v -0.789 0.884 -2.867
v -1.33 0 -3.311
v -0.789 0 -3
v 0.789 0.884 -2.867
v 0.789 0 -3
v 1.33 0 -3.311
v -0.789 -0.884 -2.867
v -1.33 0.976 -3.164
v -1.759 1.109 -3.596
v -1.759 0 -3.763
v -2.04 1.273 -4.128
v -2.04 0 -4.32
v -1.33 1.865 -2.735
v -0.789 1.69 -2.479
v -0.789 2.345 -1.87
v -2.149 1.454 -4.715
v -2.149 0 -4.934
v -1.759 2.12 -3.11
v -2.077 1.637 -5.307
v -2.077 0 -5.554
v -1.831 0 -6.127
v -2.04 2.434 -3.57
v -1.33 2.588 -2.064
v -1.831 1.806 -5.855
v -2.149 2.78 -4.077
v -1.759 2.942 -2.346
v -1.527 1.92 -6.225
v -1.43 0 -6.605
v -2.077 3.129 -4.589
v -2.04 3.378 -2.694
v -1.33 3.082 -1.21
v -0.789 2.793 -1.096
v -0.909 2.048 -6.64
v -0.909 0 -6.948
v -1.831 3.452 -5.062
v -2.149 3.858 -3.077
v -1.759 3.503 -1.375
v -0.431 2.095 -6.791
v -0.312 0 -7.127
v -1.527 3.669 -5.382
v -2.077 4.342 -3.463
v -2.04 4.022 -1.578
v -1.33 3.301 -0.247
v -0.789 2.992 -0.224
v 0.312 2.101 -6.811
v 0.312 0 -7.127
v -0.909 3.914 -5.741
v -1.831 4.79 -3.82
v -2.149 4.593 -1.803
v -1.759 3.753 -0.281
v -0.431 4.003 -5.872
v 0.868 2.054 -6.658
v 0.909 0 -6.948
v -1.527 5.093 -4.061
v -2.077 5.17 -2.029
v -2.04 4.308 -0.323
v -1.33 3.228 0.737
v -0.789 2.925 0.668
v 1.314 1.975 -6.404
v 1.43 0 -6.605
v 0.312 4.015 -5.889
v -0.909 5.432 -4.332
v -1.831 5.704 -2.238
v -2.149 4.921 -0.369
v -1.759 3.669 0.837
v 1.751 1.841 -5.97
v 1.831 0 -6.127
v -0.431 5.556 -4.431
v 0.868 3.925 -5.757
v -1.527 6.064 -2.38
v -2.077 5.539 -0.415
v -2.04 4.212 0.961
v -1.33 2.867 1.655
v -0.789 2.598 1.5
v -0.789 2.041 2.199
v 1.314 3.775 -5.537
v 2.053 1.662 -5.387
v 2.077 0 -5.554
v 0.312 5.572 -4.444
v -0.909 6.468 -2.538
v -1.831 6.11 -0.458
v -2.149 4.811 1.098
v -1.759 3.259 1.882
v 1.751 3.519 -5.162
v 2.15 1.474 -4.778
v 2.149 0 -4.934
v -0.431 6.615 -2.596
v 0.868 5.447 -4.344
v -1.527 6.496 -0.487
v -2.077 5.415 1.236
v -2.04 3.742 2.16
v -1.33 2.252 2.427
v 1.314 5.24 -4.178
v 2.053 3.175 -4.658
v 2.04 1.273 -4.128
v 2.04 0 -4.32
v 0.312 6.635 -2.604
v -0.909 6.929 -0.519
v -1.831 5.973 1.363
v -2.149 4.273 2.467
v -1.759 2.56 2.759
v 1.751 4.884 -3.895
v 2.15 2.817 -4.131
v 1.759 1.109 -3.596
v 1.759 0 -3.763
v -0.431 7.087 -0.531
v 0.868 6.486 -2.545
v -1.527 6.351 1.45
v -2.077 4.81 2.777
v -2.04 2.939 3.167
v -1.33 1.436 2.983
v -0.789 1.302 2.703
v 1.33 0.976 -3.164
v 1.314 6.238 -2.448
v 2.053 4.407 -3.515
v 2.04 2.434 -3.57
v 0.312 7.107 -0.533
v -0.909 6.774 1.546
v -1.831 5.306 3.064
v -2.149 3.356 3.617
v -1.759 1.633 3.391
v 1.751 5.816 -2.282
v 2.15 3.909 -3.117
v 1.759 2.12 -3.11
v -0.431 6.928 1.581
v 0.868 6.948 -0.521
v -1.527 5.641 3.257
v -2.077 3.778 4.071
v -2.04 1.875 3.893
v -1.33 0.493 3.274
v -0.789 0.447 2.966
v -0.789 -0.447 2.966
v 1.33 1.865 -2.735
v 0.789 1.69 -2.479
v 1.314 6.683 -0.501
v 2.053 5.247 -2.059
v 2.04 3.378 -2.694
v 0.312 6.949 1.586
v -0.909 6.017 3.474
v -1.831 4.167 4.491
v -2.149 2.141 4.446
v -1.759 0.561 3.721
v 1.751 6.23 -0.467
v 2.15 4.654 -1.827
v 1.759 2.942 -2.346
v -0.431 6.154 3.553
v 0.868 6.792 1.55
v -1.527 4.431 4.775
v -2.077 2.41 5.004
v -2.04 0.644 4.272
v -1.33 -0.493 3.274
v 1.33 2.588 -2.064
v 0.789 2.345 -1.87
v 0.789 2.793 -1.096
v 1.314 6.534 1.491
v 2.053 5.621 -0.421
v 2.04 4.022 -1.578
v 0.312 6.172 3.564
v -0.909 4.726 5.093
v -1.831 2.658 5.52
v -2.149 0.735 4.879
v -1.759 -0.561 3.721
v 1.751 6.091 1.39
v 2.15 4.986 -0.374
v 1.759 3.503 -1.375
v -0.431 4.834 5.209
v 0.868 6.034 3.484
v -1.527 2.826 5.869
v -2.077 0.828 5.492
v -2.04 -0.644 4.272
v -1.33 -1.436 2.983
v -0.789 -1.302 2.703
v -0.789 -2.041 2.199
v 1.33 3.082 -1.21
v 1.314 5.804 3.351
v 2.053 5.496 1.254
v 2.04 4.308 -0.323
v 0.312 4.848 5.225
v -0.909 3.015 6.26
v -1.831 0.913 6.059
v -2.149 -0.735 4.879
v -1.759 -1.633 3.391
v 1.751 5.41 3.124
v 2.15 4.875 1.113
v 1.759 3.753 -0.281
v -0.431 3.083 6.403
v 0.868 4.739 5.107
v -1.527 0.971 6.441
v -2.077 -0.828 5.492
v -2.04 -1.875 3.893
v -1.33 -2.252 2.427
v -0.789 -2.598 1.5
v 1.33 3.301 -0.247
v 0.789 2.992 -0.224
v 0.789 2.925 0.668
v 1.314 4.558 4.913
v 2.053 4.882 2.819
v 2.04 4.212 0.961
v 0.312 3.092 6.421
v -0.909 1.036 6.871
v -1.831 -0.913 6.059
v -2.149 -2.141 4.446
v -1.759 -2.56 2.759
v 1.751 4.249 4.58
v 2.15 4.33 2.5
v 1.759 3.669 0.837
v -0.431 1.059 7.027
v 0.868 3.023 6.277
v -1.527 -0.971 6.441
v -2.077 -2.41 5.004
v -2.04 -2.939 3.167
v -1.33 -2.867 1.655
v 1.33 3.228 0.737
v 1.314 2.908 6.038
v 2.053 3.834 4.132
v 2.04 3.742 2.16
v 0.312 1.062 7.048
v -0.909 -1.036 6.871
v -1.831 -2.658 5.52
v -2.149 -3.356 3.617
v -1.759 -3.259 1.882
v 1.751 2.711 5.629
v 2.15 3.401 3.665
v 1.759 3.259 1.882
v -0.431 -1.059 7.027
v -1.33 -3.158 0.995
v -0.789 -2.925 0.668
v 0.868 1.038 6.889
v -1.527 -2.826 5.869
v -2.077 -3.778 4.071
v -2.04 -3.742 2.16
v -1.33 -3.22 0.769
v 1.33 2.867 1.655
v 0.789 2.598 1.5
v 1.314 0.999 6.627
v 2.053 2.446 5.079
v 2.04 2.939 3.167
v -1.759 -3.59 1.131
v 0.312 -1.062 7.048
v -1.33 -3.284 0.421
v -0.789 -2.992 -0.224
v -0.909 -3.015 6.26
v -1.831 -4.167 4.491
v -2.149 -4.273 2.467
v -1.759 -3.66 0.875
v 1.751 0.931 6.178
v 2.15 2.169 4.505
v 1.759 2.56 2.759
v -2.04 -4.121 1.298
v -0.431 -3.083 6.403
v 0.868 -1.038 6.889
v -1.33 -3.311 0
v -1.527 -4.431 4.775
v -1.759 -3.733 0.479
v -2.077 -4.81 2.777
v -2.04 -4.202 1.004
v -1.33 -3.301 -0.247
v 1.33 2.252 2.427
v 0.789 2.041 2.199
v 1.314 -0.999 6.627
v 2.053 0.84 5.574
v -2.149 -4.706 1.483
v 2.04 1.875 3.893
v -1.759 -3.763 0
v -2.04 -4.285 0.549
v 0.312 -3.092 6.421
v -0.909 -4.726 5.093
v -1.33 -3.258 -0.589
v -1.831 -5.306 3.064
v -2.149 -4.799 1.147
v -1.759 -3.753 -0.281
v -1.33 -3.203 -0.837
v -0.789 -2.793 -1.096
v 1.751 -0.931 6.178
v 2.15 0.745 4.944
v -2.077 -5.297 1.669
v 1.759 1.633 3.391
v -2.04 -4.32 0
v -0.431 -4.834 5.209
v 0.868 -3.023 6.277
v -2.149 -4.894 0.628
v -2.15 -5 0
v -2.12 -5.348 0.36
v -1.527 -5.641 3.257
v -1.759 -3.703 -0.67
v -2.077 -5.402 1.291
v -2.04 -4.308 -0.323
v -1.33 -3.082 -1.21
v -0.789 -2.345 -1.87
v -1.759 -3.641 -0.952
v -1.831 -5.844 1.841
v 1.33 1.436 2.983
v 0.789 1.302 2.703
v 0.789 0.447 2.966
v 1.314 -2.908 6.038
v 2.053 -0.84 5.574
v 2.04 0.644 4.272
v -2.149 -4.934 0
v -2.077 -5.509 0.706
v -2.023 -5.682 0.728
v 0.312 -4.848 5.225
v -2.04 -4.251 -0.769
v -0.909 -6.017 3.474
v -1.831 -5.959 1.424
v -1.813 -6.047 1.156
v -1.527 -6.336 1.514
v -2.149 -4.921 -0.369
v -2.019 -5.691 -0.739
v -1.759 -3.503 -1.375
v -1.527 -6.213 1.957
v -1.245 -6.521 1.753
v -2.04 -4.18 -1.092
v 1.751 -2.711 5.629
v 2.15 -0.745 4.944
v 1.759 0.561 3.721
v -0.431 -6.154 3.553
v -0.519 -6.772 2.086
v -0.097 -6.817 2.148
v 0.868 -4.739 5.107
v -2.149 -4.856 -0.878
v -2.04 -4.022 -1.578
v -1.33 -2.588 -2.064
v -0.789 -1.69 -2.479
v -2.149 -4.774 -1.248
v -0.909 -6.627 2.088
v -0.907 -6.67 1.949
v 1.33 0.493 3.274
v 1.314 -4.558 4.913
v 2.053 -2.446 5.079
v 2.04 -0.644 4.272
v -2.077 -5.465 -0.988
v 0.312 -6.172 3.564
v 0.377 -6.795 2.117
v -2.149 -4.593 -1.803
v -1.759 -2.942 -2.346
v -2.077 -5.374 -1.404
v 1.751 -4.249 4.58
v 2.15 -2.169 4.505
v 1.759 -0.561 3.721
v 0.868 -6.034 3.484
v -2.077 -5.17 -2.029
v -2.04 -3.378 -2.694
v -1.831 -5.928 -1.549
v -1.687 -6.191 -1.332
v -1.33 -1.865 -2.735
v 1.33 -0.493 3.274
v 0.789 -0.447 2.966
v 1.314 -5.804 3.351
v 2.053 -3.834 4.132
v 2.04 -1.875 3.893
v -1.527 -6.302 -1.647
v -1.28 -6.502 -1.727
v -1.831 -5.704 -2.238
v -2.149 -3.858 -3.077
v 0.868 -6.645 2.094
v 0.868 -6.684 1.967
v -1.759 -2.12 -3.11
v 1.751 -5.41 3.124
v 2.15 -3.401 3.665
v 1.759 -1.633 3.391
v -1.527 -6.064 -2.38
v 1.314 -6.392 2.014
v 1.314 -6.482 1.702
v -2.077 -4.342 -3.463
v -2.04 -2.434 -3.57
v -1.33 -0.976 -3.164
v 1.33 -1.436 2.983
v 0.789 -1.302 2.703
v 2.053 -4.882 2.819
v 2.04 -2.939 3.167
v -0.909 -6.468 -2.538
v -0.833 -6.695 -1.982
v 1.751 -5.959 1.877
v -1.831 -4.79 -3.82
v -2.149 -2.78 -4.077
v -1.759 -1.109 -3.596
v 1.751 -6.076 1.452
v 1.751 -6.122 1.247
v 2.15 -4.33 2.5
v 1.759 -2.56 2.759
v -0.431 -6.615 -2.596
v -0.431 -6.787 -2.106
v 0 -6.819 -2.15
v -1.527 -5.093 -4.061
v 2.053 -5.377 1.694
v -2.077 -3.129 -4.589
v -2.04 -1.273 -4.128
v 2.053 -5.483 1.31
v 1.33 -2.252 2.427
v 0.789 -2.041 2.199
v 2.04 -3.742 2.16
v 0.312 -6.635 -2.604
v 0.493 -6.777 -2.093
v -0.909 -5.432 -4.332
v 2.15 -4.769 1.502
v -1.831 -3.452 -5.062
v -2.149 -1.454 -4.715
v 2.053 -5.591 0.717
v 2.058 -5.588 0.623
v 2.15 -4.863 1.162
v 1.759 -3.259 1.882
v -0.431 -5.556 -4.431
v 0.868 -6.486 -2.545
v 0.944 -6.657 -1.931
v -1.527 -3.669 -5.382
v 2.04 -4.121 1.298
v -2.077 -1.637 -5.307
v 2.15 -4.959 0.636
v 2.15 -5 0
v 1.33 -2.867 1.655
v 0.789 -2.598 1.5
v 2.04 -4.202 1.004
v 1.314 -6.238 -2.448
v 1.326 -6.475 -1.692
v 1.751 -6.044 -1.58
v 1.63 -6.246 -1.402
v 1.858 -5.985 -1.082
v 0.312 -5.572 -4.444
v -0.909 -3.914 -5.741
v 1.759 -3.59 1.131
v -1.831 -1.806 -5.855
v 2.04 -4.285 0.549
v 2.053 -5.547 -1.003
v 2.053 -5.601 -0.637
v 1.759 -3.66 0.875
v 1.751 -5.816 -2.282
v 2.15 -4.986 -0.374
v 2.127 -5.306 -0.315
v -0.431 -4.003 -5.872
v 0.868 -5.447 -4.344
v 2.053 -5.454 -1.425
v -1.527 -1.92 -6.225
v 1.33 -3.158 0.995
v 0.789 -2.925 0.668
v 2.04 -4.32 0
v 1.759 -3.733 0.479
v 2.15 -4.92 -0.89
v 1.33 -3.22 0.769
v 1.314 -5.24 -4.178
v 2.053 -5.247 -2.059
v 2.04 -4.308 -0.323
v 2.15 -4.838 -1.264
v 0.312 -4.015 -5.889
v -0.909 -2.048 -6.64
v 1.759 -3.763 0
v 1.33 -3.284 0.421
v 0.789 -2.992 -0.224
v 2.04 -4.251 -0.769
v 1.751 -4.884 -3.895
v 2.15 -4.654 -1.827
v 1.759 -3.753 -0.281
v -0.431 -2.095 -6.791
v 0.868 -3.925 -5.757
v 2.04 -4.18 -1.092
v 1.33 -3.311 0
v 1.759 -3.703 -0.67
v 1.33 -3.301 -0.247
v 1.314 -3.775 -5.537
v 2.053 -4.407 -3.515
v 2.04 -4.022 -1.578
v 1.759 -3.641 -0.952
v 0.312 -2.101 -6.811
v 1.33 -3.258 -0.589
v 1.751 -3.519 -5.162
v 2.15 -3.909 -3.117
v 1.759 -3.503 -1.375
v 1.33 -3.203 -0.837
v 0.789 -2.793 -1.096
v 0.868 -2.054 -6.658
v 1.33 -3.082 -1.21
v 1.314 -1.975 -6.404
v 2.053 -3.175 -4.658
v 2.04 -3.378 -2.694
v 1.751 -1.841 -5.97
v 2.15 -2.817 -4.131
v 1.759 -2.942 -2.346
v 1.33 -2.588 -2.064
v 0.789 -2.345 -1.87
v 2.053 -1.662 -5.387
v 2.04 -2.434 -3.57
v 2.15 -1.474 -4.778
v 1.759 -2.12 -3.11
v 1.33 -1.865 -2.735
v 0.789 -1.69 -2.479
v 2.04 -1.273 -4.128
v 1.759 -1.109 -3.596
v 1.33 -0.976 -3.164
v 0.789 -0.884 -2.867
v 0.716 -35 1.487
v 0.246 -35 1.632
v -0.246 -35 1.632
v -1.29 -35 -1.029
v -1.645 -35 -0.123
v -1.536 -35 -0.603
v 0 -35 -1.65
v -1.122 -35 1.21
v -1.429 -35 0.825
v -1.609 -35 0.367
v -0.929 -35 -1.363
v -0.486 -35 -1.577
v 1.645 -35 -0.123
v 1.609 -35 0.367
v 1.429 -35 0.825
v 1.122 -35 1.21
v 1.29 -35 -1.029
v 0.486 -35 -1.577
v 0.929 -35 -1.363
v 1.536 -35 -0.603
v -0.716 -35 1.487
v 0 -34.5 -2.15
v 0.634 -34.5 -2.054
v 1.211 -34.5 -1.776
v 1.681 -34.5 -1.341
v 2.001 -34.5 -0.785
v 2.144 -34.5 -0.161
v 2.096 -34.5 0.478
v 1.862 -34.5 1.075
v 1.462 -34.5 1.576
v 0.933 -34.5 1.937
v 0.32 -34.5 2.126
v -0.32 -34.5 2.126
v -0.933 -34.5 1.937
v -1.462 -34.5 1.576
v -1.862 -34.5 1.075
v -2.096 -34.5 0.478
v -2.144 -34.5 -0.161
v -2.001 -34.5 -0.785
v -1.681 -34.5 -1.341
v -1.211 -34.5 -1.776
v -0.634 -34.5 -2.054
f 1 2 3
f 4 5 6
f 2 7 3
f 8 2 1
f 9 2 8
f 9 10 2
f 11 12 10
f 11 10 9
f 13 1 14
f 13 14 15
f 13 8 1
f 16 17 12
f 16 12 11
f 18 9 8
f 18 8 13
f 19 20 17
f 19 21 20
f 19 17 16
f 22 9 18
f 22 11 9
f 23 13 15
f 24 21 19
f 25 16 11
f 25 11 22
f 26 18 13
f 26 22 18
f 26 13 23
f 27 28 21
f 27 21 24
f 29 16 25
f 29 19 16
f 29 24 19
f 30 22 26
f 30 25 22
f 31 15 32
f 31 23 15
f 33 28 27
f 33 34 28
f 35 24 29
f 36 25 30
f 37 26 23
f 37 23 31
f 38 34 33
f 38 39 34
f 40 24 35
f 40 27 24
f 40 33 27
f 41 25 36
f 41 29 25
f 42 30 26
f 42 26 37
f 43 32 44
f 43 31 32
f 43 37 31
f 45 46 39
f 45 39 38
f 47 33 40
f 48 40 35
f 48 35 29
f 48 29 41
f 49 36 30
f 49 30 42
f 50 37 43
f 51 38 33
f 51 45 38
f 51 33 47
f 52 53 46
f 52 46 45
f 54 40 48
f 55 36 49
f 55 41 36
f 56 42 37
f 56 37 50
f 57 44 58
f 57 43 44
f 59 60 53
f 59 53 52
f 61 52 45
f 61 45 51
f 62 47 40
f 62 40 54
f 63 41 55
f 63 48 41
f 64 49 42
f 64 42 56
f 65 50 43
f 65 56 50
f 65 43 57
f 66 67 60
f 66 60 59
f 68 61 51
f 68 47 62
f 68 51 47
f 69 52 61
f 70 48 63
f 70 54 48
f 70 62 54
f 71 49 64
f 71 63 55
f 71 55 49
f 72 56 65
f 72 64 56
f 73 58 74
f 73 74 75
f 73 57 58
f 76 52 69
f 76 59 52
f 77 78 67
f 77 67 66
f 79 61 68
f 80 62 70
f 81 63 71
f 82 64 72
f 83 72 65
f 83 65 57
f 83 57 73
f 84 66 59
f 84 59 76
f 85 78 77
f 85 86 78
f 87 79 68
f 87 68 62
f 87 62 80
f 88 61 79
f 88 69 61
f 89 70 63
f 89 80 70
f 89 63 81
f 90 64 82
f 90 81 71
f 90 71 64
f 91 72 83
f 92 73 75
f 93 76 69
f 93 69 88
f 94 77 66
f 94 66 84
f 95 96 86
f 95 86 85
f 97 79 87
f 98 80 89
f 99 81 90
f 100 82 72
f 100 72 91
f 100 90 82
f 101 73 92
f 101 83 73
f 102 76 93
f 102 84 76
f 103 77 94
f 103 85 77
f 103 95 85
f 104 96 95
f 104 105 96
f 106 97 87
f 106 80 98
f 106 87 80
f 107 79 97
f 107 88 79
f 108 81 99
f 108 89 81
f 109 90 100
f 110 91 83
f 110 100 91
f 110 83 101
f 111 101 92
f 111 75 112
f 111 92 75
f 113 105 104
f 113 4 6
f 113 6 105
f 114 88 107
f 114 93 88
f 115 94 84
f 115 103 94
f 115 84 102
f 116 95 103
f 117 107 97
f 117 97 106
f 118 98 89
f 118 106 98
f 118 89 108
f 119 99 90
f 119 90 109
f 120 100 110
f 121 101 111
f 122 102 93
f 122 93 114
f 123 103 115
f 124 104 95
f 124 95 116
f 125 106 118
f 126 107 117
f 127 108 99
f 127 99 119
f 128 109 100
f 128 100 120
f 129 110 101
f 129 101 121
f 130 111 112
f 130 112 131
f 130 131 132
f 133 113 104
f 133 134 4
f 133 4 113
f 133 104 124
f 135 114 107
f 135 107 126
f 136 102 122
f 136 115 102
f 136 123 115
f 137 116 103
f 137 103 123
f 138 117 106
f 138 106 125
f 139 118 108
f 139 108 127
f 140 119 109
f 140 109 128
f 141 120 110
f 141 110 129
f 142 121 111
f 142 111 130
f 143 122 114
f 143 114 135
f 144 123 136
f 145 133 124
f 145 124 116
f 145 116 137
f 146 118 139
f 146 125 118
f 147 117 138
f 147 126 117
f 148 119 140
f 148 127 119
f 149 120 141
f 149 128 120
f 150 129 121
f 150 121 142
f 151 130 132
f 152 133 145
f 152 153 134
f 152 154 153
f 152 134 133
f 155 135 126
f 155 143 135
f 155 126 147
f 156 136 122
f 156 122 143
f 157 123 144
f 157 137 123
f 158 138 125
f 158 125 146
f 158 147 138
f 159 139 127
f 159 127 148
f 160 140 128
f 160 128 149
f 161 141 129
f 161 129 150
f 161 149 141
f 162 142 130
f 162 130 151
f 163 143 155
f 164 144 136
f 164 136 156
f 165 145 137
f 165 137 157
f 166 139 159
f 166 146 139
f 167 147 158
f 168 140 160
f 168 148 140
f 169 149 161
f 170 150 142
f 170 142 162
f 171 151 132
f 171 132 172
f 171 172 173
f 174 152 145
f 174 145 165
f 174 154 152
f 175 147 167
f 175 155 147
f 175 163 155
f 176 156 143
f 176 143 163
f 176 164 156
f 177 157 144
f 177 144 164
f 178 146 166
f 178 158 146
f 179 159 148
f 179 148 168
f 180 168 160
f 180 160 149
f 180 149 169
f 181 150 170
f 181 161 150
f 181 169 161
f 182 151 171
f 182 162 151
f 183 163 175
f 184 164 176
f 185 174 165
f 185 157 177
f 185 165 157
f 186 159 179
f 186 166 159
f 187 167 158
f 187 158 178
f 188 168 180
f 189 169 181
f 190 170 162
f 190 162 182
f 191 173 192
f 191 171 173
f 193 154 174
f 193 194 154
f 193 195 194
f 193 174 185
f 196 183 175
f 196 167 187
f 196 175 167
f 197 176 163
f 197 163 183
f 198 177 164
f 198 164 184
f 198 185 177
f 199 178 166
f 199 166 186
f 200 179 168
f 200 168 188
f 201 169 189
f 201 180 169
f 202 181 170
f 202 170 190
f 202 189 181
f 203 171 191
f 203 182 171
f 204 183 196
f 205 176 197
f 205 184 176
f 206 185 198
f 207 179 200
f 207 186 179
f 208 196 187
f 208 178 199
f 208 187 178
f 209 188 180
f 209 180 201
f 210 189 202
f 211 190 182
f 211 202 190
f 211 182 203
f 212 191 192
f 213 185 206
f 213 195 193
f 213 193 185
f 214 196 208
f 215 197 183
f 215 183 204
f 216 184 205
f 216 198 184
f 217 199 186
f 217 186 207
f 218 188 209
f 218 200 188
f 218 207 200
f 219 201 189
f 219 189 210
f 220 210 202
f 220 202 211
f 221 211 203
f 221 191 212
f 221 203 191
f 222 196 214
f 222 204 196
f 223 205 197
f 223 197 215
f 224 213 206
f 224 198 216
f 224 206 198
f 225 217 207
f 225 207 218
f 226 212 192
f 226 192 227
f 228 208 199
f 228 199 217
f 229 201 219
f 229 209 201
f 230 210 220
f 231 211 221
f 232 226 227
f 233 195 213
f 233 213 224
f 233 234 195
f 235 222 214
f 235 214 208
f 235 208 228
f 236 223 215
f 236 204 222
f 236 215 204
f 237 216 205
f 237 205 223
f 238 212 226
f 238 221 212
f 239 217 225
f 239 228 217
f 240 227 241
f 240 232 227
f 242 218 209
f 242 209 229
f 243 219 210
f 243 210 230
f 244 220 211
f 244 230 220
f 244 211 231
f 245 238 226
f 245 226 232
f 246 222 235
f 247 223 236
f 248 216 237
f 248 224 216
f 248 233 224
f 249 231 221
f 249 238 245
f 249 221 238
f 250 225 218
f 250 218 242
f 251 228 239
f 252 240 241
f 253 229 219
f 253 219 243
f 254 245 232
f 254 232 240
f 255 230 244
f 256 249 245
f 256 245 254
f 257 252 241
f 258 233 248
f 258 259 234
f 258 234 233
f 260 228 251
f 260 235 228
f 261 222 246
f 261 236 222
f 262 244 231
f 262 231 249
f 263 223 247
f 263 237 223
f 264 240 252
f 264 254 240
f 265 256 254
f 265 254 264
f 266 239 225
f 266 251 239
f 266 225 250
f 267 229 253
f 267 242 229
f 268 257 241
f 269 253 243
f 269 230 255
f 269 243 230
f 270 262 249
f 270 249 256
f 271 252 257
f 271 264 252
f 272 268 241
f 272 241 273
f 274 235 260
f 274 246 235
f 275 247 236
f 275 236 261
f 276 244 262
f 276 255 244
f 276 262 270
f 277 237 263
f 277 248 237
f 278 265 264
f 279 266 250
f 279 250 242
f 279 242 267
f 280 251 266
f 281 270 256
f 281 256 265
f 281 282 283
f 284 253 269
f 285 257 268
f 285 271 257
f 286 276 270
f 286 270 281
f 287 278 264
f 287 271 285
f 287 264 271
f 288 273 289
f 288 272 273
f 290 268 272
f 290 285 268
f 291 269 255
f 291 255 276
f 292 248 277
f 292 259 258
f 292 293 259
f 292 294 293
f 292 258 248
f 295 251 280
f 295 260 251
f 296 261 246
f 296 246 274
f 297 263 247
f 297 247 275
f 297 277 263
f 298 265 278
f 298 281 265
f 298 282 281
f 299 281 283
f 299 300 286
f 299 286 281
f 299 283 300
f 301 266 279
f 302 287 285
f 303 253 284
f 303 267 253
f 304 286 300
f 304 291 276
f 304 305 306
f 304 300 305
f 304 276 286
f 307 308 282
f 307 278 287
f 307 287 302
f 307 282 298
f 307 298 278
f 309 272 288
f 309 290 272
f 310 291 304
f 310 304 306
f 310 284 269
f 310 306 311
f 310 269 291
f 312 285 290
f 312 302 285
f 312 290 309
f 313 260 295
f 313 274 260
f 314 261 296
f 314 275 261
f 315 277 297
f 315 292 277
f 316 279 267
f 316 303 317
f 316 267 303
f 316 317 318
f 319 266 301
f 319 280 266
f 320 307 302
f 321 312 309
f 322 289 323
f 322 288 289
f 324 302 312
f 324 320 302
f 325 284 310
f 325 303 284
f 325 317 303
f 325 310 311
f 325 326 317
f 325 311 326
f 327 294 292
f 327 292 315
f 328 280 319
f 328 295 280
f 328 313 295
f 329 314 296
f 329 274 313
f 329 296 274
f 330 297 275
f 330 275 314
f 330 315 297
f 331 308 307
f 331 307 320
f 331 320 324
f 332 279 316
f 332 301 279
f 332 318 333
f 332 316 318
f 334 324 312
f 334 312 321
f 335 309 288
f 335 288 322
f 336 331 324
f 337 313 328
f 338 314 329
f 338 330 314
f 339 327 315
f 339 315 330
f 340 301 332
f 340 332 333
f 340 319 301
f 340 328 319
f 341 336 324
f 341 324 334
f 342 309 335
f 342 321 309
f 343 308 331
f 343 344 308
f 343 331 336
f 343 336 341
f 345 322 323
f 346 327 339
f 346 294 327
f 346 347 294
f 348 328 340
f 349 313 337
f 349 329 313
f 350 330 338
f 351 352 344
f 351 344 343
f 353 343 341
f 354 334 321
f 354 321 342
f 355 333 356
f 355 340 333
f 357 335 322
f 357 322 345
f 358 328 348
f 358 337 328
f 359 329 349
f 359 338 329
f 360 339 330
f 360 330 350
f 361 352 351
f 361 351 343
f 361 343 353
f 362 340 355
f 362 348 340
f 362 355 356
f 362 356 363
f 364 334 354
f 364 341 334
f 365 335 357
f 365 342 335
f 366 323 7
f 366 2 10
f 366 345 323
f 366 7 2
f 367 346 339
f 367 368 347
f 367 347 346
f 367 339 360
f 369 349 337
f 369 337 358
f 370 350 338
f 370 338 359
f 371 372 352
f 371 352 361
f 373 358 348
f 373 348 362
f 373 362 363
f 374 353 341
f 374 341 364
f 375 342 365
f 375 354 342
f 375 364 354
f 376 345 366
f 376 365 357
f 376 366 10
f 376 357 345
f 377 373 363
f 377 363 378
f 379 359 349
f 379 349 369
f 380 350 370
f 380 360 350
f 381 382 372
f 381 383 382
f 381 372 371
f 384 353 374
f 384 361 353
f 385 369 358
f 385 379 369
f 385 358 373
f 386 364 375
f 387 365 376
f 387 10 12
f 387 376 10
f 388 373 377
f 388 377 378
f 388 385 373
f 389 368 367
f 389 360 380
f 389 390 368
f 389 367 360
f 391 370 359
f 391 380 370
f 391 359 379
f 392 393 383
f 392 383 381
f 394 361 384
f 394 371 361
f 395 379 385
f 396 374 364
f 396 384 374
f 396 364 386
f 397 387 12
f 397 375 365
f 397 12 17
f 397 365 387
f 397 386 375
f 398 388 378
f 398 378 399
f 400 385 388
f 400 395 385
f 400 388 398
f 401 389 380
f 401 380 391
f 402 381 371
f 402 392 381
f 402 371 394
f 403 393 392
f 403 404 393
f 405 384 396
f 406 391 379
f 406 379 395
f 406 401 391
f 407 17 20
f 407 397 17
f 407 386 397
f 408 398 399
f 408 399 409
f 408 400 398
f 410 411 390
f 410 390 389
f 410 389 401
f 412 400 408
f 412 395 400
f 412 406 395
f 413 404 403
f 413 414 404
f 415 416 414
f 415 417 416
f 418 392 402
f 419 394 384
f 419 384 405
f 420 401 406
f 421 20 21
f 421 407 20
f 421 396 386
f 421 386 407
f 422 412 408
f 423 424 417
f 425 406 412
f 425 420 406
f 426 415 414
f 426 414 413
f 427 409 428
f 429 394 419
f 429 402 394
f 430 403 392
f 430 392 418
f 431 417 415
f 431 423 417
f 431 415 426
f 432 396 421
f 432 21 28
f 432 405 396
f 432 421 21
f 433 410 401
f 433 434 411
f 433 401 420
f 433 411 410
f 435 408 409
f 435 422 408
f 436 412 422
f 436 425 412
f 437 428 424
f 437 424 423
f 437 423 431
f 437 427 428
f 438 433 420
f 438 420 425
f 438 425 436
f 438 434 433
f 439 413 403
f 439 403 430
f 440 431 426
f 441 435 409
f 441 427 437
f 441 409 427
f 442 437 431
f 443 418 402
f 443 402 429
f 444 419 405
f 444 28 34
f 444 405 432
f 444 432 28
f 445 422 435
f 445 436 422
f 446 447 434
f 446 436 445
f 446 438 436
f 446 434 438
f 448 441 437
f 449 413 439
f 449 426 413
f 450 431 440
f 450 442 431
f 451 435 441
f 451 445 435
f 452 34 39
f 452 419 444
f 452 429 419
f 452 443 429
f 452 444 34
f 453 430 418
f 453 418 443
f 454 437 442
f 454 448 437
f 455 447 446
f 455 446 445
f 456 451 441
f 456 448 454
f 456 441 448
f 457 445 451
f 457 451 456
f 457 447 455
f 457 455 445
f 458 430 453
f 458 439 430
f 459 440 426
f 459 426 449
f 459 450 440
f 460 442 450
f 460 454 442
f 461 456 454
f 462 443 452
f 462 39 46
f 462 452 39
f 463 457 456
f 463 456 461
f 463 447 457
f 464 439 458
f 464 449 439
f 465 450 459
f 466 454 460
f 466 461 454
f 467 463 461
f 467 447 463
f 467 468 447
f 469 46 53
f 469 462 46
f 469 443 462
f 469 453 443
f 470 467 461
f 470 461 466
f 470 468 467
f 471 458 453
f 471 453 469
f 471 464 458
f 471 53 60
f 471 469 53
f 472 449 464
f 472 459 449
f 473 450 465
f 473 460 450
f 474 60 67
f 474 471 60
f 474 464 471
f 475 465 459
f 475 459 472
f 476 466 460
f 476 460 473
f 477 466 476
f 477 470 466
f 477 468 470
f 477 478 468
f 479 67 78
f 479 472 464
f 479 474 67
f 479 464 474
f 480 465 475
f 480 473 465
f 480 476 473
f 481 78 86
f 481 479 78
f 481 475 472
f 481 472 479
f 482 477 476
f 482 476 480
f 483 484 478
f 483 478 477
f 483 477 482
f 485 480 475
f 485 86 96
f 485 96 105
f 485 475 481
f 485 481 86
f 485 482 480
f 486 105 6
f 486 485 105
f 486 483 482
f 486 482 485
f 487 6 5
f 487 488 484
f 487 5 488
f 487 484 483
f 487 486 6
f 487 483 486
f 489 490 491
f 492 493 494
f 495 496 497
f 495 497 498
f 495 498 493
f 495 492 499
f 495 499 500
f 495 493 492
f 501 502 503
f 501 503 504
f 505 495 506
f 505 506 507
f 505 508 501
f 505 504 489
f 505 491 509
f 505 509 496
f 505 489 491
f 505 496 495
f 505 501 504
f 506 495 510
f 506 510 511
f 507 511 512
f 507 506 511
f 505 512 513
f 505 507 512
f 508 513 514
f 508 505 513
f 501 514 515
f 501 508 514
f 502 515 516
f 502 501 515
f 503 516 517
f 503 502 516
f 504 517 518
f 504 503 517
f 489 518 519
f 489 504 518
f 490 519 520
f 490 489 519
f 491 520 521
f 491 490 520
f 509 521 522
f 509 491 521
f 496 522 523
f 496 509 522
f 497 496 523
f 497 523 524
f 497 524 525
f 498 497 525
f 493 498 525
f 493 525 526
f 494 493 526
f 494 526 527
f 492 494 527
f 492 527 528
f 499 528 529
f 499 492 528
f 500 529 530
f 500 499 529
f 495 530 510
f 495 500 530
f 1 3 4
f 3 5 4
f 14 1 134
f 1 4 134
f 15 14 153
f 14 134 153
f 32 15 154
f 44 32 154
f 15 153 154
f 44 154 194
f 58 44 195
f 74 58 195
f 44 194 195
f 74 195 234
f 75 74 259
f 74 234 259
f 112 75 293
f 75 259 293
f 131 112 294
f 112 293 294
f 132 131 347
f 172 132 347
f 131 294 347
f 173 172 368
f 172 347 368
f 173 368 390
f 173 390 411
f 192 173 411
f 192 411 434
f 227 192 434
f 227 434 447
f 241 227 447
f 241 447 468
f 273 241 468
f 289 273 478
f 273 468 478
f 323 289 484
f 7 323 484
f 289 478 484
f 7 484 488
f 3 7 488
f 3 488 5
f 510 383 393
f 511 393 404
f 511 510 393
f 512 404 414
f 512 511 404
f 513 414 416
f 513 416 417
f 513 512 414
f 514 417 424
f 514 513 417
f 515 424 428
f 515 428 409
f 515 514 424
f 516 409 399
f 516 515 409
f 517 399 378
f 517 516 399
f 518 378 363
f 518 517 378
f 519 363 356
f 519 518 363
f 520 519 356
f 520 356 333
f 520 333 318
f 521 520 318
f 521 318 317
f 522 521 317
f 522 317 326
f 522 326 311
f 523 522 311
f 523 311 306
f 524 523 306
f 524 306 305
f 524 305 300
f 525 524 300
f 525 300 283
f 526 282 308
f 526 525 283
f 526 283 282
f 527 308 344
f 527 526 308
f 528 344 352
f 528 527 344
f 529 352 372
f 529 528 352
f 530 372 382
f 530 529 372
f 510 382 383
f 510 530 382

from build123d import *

# Parameters (mm, degrees)
VARREDURA_DA_ARGOLA_PROFILE_R = 2.15
VARREDURA_DO_PINO_PROFILE_R   = 2.15
CHANFRO_DO_PINO_SIZE          = 0.5
CORTE_EXTRUS_O1_DEPTH         = 36.787497843
CORTE_EXTRUS_O1_DEPTH_BACK    = 36.787497843
ESBO_O1_R                     = 3
ESBO_O1_R_2                   = 2.85


with BuildPart() as part:
    # Varredura da Argola: sweep along a path in Argola
    with BuildLine(Plane(origin=(0, 0, 0), x_dir=(0, 0, -1), z_dir=(1, 0, 0))) as varredura_da_argola_path:
        CenterArc((0, 0), 5, 0, 360)
    # Varredura da Argola profile (on start of the path) → Varredura da Argola (sweep)
    with BuildSketch(Plane(origin=(0, 0, -5), x_dir=(0, 0, 1), z_dir=(0, 1, 0))):
        Circle(VARREDURA_DA_ARGOLA_PROFILE_R)
    sweep(path=varredura_da_argola_path.line)

    # Varredura do Pino: sweep along a path in Pino
    with BuildLine(Plane(origin=(0, 0, 0), x_dir=(0, 0, -1), z_dir=(1, 0, 0))) as varredura_do_pino_path:
        Line((0, -5), (0, -35))
    # Varredura do Pino profile (on start of the path) → Varredura do Pino (sweep)
    with BuildSketch(Plane(origin=(0, -5, 0), x_dir=(0, 0, -1), z_dir=(0, -1, 0))):
        Circle(VARREDURA_DO_PINO_PROFILE_R)
    sweep(path=varredura_do_pino_path.line)

    # Chanfro do pino
    chanfro_do_pino_edges = [part.edges().sort_by_distance(p)[0] for p in [
        (0, -35, 2.15),
    ]]
    chamfer(chanfro_do_pino_edges, length=CHANFRO_DO_PINO_SIZE)

    # Esboço1 → Corte-extrusão1 (cut, two sides: drawn at the far end of the back side and taken through both)
    with BuildSketch(Plane(origin=(0, 0, 0), x_dir=(0, 0, -1), z_dir=(1, 0, 0)).offset(-CORTE_EXTRUS_O1_DEPTH_BACK)):
        Circle(ESBO_O1_R)
        Circle(ESBO_O1_R_2, mode=Mode.SUBTRACT)
    extrude(amount=CORTE_EXTRUS_O1_DEPTH + CORTE_EXTRUS_O1_DEPTH_BACK, mode=Mode.SUBTRACT)


solid = part.part
